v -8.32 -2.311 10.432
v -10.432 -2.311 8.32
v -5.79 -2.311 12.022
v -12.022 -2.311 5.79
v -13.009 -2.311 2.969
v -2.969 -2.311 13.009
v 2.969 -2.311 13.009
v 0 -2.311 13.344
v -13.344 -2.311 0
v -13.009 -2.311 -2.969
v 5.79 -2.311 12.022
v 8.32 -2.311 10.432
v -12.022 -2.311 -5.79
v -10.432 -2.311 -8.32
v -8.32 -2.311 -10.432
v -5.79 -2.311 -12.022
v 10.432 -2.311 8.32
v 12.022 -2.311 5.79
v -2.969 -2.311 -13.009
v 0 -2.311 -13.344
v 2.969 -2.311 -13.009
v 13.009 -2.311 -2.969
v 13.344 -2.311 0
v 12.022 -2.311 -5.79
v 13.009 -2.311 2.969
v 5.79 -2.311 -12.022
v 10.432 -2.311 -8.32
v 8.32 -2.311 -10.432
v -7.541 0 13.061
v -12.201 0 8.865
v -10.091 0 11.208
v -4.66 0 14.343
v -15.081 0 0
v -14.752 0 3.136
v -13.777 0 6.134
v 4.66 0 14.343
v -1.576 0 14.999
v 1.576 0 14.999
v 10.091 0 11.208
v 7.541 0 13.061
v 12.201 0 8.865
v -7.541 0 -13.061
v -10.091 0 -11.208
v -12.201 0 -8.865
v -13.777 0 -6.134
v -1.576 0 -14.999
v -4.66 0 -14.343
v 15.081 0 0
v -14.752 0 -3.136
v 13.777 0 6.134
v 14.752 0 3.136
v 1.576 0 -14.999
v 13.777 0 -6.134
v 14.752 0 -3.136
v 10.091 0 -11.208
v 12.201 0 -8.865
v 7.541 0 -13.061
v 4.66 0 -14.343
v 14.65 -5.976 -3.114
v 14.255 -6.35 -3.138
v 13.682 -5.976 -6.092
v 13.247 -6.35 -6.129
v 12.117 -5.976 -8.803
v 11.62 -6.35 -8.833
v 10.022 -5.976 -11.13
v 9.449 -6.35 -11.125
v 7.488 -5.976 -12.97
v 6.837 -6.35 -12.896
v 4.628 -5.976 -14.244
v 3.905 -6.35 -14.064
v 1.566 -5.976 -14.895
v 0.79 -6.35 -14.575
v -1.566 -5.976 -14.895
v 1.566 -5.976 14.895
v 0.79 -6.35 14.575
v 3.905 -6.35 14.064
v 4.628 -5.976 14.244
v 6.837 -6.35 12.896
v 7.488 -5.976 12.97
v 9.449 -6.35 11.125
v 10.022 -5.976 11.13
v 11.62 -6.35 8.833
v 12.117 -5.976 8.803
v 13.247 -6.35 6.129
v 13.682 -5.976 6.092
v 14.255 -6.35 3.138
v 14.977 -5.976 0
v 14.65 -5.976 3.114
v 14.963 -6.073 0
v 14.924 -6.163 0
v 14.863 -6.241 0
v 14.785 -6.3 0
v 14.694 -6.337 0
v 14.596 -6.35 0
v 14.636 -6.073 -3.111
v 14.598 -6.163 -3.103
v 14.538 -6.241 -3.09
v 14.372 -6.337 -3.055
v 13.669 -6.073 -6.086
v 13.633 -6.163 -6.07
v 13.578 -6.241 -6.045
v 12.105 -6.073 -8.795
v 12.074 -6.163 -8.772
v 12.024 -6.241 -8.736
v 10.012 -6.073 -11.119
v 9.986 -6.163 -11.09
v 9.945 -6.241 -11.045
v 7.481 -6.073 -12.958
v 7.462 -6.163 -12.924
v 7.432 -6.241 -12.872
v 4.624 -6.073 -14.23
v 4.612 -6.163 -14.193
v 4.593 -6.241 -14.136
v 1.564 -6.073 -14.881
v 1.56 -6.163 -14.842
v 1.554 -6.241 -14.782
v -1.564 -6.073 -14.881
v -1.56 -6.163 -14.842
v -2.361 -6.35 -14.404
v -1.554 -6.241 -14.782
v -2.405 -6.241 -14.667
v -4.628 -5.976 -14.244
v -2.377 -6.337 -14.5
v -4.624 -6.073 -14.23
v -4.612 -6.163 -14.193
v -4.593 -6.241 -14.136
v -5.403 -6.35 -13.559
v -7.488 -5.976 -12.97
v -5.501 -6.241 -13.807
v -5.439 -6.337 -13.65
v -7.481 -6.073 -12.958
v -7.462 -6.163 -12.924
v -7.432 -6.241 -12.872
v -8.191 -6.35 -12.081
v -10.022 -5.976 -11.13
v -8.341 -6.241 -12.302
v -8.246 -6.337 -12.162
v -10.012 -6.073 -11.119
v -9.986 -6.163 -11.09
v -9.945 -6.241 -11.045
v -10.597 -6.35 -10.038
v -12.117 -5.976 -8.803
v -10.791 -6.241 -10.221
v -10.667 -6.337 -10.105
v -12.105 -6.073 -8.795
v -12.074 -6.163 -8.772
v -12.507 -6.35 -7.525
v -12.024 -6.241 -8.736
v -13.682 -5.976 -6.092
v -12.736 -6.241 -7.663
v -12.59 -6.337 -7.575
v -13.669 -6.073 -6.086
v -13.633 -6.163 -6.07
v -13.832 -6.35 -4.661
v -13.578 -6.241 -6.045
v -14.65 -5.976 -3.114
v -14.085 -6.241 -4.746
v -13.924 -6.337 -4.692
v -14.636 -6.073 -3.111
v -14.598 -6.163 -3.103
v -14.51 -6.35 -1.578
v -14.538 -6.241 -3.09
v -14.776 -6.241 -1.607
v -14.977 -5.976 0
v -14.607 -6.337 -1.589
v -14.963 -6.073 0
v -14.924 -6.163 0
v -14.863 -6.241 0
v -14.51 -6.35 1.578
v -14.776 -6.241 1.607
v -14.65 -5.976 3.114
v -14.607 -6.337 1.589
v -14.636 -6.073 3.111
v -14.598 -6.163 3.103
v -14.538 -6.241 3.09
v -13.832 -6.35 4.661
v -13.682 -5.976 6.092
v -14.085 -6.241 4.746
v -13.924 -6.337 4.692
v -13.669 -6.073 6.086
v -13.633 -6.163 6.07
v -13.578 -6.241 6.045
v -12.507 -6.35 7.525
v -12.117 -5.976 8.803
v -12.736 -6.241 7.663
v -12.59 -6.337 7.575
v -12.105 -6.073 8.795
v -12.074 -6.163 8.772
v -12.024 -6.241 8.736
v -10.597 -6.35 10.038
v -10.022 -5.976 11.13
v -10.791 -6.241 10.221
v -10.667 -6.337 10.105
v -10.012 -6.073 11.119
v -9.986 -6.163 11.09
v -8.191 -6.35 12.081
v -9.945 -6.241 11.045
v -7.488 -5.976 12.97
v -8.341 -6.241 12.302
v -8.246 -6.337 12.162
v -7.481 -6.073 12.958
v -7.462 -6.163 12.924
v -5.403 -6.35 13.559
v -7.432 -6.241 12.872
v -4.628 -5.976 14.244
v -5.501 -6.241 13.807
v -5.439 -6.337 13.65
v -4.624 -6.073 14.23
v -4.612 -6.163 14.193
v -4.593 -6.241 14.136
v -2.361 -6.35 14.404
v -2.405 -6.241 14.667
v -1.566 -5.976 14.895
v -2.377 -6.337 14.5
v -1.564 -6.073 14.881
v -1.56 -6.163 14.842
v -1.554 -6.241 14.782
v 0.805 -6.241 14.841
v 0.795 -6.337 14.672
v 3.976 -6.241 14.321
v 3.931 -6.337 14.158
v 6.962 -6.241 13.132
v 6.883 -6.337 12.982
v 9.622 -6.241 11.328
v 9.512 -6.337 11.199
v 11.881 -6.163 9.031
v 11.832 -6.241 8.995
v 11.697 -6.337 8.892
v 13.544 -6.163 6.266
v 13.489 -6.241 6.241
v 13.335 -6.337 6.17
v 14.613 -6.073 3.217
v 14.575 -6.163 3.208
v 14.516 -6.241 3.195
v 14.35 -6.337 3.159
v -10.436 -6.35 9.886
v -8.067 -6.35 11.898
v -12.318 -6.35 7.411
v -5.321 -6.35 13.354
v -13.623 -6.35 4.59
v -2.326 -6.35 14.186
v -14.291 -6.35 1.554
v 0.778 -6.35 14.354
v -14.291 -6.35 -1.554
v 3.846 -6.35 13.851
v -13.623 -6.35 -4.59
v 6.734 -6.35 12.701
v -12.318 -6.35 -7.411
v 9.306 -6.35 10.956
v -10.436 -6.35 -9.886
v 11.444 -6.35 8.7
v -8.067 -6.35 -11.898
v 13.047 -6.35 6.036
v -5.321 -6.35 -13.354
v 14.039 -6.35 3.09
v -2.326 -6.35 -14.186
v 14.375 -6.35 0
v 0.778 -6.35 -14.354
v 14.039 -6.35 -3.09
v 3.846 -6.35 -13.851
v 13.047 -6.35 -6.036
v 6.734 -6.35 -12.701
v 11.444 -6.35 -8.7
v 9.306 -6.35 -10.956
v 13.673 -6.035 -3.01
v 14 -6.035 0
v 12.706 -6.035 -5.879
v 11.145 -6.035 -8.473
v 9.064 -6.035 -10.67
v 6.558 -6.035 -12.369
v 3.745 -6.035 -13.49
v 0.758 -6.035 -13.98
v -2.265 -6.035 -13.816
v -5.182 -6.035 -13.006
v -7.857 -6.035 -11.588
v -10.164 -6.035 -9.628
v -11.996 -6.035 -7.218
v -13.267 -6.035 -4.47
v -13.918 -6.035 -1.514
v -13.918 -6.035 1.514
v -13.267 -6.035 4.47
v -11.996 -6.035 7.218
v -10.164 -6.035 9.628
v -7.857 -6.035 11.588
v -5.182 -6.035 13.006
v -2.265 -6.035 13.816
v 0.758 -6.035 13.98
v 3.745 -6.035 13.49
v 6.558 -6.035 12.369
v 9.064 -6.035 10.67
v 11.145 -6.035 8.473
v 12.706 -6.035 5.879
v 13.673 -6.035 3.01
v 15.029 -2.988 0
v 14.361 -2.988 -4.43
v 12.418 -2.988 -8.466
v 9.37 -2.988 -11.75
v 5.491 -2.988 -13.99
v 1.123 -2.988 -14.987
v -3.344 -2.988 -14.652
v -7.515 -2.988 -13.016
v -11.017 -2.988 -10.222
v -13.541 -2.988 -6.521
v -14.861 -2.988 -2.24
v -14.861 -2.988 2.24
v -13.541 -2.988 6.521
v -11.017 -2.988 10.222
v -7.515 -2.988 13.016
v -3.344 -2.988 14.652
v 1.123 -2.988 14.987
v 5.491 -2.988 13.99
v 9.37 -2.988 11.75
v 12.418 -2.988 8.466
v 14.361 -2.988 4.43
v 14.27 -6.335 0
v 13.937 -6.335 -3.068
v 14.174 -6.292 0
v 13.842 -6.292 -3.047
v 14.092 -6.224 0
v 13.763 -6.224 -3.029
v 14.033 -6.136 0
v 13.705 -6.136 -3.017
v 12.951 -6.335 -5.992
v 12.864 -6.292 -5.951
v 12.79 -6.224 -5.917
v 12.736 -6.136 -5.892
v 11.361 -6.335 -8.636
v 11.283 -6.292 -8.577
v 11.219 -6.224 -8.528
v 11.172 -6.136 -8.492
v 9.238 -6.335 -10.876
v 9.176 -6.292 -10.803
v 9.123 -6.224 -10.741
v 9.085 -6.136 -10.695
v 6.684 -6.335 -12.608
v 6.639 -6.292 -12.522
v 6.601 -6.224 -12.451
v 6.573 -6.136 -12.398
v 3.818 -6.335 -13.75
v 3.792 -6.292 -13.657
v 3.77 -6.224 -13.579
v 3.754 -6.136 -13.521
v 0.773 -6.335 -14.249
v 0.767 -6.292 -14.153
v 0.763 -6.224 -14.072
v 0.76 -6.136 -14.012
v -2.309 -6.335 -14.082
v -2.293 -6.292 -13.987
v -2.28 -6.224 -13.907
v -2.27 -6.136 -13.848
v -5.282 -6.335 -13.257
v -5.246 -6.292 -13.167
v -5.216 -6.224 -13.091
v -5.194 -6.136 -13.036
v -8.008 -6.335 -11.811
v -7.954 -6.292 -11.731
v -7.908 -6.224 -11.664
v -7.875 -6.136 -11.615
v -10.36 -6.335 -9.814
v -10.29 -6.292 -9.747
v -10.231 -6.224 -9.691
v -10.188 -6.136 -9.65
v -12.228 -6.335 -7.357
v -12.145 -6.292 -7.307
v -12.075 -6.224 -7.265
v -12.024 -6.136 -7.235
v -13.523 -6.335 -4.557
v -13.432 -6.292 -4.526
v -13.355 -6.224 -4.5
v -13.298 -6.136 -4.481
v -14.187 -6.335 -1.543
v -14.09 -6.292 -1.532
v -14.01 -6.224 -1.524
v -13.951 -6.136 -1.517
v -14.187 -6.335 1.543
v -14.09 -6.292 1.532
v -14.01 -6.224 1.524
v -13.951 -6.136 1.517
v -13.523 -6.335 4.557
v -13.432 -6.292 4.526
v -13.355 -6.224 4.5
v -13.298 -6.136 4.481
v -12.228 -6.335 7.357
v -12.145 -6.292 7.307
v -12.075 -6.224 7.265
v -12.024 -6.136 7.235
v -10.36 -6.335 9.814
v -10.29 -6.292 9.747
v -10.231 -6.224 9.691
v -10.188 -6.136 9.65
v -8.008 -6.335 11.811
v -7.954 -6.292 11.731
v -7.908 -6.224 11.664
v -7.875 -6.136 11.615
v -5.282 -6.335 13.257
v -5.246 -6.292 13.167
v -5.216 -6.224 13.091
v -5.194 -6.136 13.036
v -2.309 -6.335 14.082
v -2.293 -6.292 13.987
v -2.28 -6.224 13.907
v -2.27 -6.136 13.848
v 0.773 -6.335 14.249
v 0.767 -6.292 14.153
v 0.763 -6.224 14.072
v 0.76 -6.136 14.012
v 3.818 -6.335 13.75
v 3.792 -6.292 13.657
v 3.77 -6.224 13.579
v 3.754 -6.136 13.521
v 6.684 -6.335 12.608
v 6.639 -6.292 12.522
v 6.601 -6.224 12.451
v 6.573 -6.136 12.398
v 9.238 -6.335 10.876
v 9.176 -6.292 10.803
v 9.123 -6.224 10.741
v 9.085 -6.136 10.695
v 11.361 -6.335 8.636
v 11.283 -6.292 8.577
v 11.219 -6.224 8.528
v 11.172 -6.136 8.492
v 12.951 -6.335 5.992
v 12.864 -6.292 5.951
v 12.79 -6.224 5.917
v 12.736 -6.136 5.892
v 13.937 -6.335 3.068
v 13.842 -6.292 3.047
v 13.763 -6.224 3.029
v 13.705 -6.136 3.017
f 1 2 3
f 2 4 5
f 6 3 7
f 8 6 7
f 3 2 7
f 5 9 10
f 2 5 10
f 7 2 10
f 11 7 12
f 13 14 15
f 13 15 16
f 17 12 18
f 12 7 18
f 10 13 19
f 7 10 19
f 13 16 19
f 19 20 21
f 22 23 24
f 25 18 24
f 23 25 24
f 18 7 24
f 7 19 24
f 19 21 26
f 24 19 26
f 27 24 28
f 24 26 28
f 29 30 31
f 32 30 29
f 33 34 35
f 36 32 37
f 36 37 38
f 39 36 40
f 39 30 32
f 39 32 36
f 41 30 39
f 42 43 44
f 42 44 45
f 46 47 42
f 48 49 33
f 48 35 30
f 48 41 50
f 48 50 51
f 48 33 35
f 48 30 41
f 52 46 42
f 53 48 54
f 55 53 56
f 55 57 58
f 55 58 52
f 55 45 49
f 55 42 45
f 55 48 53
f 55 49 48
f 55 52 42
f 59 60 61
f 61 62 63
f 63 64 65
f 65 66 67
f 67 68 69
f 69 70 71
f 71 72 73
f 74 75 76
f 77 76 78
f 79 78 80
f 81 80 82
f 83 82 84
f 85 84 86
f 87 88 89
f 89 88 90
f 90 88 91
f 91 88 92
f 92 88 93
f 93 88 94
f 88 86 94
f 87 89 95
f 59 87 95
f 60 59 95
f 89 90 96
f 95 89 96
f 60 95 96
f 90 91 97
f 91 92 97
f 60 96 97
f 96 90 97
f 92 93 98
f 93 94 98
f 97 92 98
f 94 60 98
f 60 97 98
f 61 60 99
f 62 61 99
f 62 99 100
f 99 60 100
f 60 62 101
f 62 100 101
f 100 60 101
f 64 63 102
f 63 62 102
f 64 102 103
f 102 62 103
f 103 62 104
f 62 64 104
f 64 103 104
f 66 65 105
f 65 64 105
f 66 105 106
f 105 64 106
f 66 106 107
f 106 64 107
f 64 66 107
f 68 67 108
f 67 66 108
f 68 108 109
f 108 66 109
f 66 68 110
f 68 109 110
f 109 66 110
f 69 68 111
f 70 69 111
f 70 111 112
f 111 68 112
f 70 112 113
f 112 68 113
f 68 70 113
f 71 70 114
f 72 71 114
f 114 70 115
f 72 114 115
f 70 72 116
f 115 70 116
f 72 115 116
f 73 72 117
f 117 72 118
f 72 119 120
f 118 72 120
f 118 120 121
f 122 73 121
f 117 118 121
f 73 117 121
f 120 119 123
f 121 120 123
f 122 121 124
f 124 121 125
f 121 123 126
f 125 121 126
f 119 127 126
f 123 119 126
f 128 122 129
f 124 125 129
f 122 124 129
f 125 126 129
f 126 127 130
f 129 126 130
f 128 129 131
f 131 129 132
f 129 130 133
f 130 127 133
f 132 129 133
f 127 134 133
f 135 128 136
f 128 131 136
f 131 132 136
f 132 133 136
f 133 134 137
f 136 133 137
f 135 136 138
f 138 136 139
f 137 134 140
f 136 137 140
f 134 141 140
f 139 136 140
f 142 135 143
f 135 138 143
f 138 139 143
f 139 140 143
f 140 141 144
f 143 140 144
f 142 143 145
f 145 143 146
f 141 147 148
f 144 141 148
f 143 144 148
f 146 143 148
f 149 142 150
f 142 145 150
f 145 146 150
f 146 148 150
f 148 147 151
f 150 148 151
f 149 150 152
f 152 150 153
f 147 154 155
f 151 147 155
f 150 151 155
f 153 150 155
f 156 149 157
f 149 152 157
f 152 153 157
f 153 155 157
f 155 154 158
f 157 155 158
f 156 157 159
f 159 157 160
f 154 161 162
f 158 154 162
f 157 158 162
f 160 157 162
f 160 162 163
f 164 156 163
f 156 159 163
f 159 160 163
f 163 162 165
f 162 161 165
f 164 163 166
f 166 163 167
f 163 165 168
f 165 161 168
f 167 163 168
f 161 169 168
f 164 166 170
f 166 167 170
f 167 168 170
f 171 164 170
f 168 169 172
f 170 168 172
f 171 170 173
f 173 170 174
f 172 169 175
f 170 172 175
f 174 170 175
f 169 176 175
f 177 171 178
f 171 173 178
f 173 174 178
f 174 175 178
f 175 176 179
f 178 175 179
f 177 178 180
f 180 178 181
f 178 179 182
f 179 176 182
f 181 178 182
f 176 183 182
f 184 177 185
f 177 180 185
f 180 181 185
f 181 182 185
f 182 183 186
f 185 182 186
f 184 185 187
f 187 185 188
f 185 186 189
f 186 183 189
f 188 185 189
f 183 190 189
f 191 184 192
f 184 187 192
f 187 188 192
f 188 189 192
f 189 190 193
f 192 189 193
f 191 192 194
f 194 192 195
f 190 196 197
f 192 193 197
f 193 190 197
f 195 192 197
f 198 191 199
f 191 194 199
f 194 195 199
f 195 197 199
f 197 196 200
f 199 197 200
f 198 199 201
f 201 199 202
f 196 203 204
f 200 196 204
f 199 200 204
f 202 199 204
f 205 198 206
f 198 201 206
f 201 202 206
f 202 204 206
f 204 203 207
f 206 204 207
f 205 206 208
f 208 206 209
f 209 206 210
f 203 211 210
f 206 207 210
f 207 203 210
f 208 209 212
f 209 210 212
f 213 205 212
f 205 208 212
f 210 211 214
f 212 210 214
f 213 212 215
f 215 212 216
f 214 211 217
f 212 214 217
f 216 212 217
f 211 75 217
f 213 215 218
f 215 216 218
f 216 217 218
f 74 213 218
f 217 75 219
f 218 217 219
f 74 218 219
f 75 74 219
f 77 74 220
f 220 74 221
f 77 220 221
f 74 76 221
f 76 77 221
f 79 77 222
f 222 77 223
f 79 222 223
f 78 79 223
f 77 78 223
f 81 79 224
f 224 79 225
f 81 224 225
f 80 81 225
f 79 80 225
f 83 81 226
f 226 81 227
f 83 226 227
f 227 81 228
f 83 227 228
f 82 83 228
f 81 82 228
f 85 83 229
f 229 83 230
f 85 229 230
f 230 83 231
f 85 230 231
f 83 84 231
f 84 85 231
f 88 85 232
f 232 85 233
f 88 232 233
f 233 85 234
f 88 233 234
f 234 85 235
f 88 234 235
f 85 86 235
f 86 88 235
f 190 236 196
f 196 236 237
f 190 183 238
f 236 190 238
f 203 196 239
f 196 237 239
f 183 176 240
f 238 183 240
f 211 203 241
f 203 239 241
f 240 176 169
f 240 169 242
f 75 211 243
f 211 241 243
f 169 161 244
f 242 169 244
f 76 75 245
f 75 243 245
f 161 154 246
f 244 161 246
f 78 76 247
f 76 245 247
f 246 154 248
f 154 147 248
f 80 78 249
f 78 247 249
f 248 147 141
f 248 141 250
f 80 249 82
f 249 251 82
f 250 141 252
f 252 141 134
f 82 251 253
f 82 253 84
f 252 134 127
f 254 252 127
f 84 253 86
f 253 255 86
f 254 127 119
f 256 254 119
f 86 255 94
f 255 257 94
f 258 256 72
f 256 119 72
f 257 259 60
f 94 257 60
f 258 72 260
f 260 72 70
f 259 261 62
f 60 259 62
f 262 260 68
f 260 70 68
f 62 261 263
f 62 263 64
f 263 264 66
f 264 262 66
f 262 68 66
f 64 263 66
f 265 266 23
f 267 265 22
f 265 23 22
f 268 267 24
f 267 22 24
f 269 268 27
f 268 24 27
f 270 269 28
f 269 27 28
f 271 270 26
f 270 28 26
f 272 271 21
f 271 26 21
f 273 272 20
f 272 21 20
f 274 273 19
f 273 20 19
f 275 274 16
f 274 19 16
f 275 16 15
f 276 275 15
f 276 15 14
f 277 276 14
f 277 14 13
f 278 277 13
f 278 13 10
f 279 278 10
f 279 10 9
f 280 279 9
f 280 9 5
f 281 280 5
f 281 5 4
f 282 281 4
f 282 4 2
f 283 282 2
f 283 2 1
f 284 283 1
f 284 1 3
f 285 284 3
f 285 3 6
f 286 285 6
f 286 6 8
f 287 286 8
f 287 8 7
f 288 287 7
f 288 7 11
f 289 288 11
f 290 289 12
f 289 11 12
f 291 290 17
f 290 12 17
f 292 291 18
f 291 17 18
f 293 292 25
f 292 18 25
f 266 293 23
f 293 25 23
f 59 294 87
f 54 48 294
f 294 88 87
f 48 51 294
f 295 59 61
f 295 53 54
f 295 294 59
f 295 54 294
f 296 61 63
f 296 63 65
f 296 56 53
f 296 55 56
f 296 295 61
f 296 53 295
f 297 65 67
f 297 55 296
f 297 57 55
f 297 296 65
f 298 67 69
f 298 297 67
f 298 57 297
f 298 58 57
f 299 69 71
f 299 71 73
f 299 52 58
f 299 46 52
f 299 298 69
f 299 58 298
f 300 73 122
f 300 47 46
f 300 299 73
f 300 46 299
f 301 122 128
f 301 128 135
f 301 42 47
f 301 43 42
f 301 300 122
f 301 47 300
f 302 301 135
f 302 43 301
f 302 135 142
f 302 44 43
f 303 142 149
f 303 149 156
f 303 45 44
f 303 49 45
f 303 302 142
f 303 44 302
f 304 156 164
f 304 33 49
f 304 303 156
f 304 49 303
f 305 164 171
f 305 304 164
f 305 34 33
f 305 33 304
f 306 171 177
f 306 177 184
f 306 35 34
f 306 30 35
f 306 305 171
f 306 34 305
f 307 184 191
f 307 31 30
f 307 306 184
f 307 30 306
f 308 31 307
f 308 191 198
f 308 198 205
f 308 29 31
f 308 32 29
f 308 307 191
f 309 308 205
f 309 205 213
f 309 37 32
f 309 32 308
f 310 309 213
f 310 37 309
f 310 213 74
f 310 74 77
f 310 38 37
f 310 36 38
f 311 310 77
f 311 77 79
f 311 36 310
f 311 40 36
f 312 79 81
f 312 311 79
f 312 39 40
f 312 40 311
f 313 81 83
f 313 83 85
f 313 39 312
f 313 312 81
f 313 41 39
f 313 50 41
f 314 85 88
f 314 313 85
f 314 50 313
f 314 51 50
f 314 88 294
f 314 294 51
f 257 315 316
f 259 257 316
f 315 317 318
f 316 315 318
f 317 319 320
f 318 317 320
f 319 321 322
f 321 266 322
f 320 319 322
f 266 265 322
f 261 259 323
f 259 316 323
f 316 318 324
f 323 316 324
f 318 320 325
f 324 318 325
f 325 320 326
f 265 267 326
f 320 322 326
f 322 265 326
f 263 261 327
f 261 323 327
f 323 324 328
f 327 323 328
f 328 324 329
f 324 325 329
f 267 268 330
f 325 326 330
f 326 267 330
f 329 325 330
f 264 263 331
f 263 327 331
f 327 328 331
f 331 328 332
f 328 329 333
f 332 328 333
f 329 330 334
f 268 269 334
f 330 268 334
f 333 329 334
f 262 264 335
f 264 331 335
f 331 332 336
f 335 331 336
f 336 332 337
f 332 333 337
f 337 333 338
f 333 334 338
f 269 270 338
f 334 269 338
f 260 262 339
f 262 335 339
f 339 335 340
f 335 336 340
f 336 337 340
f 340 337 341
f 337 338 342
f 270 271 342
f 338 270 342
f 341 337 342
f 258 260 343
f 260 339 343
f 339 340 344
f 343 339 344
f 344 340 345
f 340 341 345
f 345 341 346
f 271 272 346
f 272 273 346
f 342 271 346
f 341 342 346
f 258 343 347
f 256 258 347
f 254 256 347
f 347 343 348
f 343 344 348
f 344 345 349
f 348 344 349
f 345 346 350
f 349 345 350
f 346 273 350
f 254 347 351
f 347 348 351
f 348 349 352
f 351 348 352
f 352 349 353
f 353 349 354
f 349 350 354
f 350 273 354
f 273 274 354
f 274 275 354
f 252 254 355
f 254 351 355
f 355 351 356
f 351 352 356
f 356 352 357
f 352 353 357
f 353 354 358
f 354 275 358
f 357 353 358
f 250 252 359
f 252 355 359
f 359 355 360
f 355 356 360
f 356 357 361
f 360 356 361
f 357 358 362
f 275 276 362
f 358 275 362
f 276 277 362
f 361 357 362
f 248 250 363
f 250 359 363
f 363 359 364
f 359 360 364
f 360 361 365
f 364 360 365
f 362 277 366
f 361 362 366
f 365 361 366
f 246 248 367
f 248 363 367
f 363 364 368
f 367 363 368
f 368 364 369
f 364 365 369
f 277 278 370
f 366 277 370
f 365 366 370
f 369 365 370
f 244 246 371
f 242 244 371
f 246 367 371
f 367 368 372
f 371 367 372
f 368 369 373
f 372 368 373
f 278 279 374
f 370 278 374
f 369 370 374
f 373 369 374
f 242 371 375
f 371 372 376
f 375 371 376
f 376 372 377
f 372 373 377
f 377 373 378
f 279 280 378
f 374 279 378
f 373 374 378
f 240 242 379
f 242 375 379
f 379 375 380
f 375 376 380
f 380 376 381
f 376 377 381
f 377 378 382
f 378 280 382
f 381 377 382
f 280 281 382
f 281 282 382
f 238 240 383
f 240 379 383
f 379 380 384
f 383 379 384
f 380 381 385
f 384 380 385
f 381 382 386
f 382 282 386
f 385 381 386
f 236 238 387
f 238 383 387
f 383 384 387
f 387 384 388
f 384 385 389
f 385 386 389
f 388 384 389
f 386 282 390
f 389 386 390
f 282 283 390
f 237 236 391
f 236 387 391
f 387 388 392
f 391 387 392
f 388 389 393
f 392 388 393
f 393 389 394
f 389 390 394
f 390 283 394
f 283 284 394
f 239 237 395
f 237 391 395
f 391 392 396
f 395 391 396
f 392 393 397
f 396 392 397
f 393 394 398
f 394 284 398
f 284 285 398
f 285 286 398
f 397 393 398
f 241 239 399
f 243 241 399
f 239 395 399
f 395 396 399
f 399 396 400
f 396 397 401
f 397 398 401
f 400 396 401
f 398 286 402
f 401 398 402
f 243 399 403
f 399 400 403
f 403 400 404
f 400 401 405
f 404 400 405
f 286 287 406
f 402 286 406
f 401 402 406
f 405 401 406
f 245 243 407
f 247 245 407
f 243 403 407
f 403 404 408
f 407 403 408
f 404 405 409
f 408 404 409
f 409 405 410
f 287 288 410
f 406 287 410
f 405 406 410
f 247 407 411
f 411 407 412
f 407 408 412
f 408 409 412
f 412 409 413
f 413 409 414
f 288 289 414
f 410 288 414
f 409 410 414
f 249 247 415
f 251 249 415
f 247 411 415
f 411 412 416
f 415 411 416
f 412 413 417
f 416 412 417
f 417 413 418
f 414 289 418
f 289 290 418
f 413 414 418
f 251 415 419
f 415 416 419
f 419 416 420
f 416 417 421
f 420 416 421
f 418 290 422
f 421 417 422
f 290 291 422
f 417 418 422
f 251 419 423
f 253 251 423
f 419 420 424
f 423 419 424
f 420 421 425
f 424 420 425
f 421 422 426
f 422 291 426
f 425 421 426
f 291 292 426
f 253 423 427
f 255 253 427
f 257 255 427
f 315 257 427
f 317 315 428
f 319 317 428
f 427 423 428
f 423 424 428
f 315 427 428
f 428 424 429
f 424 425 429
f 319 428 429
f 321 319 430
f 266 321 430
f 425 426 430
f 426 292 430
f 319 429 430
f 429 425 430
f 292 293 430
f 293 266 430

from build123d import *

# Parameters (mm, degrees)
SKETCH1_R           = 15.08125
BOSS_EXTRUDE1_DEPTH = 2.3114
BOSS_EXTRUDE1_DRAFT = -1
SKETCH7_R           = 15.08125
SKETCH7_R_2         = 13.30325
BOSS_EXTRUDE3_DEPTH = 6.35
BOSS_EXTRUDE3_DRAFT = -1
DRAFT1_ANGLE        = 10
FILLET2_R           = 0.381


with BuildPart() as part:
    # Sketch1 → Boss-Extrude1 (with draft: the straight prism first)
    with BuildSketch(Plane(origin=(0, 0, 0), x_dir=(1, 0, 0), z_dir=(0, 1, 0))):
        Circle(SKETCH1_R)
    extrude(amount=-BOSS_EXTRUDE1_DEPTH)
    # Boss-Extrude1: the draft: its side faces are tilted about the plane it starts from
    boss_extrude1_sides = [part.faces().sort_by_distance(p)[0] for p in [
        (-15.08125, -1.1557, 0),
    ]]
    draft(boss_extrude1_sides, Plane(origin=(0, 0, 0), x_dir=(1, 0, 0), z_dir=(0, 1, 0)), BOSS_EXTRUDE1_DRAFT)


with BuildPart() as boss_extrude3_tool:
    # Sketch7 → Boss-Extrude3 (with draft: the straight prism first)
    with BuildSketch(Plane(origin=(0, 0, 0), x_dir=(1, 0, 0), z_dir=(0, 1, 0))):
        Circle(SKETCH7_R)
        Circle(SKETCH7_R_2, mode=Mode.SUBTRACT)
    extrude(amount=-BOSS_EXTRUDE3_DEPTH)
    # Boss-Extrude3: the draft: its side faces are tilted about the plane it starts from
    boss_extrude3_sides = [boss_extrude3_tool.faces().sort_by_distance(p)[0] for p in [
        (-15.08125, -3.175, 0),
        (-13.30325, -3.175, 0),
    ]]
    draft(boss_extrude3_sides, Plane(origin=(0, 0, 0), x_dir=(1, 0, 0), z_dir=(0, 1, 0)), BOSS_EXTRUDE3_DRAFT)


with BuildPart() as part_1:
    add(part.part)

    # Boss-Extrude3: add boss_extrude3_tool
    add(boss_extrude3_tool.part)

    # Draft1
    draft1_faces = [part_1.faces().sort_by_distance(p)[0] for p in [
        (-13.37884265, -4.3307, 0),
    ]]
    draft(draft1_faces, Plane(origin=(0, -2.3114, 0), x_dir=(0, 0, -1), z_dir=(0, -1, 0)), DRAFT1_ANGLE)

    # Fillet2
    fillet2_edges = [part_1.edges().sort_by_distance(p)[0] for p in [
        (-14.970410338, -6.35, 0),
        (-14.055709781, -6.35, 0),
    ]]
    fillet(fillet2_edges, radius=FILLET2_R)


solid = part_1.part
